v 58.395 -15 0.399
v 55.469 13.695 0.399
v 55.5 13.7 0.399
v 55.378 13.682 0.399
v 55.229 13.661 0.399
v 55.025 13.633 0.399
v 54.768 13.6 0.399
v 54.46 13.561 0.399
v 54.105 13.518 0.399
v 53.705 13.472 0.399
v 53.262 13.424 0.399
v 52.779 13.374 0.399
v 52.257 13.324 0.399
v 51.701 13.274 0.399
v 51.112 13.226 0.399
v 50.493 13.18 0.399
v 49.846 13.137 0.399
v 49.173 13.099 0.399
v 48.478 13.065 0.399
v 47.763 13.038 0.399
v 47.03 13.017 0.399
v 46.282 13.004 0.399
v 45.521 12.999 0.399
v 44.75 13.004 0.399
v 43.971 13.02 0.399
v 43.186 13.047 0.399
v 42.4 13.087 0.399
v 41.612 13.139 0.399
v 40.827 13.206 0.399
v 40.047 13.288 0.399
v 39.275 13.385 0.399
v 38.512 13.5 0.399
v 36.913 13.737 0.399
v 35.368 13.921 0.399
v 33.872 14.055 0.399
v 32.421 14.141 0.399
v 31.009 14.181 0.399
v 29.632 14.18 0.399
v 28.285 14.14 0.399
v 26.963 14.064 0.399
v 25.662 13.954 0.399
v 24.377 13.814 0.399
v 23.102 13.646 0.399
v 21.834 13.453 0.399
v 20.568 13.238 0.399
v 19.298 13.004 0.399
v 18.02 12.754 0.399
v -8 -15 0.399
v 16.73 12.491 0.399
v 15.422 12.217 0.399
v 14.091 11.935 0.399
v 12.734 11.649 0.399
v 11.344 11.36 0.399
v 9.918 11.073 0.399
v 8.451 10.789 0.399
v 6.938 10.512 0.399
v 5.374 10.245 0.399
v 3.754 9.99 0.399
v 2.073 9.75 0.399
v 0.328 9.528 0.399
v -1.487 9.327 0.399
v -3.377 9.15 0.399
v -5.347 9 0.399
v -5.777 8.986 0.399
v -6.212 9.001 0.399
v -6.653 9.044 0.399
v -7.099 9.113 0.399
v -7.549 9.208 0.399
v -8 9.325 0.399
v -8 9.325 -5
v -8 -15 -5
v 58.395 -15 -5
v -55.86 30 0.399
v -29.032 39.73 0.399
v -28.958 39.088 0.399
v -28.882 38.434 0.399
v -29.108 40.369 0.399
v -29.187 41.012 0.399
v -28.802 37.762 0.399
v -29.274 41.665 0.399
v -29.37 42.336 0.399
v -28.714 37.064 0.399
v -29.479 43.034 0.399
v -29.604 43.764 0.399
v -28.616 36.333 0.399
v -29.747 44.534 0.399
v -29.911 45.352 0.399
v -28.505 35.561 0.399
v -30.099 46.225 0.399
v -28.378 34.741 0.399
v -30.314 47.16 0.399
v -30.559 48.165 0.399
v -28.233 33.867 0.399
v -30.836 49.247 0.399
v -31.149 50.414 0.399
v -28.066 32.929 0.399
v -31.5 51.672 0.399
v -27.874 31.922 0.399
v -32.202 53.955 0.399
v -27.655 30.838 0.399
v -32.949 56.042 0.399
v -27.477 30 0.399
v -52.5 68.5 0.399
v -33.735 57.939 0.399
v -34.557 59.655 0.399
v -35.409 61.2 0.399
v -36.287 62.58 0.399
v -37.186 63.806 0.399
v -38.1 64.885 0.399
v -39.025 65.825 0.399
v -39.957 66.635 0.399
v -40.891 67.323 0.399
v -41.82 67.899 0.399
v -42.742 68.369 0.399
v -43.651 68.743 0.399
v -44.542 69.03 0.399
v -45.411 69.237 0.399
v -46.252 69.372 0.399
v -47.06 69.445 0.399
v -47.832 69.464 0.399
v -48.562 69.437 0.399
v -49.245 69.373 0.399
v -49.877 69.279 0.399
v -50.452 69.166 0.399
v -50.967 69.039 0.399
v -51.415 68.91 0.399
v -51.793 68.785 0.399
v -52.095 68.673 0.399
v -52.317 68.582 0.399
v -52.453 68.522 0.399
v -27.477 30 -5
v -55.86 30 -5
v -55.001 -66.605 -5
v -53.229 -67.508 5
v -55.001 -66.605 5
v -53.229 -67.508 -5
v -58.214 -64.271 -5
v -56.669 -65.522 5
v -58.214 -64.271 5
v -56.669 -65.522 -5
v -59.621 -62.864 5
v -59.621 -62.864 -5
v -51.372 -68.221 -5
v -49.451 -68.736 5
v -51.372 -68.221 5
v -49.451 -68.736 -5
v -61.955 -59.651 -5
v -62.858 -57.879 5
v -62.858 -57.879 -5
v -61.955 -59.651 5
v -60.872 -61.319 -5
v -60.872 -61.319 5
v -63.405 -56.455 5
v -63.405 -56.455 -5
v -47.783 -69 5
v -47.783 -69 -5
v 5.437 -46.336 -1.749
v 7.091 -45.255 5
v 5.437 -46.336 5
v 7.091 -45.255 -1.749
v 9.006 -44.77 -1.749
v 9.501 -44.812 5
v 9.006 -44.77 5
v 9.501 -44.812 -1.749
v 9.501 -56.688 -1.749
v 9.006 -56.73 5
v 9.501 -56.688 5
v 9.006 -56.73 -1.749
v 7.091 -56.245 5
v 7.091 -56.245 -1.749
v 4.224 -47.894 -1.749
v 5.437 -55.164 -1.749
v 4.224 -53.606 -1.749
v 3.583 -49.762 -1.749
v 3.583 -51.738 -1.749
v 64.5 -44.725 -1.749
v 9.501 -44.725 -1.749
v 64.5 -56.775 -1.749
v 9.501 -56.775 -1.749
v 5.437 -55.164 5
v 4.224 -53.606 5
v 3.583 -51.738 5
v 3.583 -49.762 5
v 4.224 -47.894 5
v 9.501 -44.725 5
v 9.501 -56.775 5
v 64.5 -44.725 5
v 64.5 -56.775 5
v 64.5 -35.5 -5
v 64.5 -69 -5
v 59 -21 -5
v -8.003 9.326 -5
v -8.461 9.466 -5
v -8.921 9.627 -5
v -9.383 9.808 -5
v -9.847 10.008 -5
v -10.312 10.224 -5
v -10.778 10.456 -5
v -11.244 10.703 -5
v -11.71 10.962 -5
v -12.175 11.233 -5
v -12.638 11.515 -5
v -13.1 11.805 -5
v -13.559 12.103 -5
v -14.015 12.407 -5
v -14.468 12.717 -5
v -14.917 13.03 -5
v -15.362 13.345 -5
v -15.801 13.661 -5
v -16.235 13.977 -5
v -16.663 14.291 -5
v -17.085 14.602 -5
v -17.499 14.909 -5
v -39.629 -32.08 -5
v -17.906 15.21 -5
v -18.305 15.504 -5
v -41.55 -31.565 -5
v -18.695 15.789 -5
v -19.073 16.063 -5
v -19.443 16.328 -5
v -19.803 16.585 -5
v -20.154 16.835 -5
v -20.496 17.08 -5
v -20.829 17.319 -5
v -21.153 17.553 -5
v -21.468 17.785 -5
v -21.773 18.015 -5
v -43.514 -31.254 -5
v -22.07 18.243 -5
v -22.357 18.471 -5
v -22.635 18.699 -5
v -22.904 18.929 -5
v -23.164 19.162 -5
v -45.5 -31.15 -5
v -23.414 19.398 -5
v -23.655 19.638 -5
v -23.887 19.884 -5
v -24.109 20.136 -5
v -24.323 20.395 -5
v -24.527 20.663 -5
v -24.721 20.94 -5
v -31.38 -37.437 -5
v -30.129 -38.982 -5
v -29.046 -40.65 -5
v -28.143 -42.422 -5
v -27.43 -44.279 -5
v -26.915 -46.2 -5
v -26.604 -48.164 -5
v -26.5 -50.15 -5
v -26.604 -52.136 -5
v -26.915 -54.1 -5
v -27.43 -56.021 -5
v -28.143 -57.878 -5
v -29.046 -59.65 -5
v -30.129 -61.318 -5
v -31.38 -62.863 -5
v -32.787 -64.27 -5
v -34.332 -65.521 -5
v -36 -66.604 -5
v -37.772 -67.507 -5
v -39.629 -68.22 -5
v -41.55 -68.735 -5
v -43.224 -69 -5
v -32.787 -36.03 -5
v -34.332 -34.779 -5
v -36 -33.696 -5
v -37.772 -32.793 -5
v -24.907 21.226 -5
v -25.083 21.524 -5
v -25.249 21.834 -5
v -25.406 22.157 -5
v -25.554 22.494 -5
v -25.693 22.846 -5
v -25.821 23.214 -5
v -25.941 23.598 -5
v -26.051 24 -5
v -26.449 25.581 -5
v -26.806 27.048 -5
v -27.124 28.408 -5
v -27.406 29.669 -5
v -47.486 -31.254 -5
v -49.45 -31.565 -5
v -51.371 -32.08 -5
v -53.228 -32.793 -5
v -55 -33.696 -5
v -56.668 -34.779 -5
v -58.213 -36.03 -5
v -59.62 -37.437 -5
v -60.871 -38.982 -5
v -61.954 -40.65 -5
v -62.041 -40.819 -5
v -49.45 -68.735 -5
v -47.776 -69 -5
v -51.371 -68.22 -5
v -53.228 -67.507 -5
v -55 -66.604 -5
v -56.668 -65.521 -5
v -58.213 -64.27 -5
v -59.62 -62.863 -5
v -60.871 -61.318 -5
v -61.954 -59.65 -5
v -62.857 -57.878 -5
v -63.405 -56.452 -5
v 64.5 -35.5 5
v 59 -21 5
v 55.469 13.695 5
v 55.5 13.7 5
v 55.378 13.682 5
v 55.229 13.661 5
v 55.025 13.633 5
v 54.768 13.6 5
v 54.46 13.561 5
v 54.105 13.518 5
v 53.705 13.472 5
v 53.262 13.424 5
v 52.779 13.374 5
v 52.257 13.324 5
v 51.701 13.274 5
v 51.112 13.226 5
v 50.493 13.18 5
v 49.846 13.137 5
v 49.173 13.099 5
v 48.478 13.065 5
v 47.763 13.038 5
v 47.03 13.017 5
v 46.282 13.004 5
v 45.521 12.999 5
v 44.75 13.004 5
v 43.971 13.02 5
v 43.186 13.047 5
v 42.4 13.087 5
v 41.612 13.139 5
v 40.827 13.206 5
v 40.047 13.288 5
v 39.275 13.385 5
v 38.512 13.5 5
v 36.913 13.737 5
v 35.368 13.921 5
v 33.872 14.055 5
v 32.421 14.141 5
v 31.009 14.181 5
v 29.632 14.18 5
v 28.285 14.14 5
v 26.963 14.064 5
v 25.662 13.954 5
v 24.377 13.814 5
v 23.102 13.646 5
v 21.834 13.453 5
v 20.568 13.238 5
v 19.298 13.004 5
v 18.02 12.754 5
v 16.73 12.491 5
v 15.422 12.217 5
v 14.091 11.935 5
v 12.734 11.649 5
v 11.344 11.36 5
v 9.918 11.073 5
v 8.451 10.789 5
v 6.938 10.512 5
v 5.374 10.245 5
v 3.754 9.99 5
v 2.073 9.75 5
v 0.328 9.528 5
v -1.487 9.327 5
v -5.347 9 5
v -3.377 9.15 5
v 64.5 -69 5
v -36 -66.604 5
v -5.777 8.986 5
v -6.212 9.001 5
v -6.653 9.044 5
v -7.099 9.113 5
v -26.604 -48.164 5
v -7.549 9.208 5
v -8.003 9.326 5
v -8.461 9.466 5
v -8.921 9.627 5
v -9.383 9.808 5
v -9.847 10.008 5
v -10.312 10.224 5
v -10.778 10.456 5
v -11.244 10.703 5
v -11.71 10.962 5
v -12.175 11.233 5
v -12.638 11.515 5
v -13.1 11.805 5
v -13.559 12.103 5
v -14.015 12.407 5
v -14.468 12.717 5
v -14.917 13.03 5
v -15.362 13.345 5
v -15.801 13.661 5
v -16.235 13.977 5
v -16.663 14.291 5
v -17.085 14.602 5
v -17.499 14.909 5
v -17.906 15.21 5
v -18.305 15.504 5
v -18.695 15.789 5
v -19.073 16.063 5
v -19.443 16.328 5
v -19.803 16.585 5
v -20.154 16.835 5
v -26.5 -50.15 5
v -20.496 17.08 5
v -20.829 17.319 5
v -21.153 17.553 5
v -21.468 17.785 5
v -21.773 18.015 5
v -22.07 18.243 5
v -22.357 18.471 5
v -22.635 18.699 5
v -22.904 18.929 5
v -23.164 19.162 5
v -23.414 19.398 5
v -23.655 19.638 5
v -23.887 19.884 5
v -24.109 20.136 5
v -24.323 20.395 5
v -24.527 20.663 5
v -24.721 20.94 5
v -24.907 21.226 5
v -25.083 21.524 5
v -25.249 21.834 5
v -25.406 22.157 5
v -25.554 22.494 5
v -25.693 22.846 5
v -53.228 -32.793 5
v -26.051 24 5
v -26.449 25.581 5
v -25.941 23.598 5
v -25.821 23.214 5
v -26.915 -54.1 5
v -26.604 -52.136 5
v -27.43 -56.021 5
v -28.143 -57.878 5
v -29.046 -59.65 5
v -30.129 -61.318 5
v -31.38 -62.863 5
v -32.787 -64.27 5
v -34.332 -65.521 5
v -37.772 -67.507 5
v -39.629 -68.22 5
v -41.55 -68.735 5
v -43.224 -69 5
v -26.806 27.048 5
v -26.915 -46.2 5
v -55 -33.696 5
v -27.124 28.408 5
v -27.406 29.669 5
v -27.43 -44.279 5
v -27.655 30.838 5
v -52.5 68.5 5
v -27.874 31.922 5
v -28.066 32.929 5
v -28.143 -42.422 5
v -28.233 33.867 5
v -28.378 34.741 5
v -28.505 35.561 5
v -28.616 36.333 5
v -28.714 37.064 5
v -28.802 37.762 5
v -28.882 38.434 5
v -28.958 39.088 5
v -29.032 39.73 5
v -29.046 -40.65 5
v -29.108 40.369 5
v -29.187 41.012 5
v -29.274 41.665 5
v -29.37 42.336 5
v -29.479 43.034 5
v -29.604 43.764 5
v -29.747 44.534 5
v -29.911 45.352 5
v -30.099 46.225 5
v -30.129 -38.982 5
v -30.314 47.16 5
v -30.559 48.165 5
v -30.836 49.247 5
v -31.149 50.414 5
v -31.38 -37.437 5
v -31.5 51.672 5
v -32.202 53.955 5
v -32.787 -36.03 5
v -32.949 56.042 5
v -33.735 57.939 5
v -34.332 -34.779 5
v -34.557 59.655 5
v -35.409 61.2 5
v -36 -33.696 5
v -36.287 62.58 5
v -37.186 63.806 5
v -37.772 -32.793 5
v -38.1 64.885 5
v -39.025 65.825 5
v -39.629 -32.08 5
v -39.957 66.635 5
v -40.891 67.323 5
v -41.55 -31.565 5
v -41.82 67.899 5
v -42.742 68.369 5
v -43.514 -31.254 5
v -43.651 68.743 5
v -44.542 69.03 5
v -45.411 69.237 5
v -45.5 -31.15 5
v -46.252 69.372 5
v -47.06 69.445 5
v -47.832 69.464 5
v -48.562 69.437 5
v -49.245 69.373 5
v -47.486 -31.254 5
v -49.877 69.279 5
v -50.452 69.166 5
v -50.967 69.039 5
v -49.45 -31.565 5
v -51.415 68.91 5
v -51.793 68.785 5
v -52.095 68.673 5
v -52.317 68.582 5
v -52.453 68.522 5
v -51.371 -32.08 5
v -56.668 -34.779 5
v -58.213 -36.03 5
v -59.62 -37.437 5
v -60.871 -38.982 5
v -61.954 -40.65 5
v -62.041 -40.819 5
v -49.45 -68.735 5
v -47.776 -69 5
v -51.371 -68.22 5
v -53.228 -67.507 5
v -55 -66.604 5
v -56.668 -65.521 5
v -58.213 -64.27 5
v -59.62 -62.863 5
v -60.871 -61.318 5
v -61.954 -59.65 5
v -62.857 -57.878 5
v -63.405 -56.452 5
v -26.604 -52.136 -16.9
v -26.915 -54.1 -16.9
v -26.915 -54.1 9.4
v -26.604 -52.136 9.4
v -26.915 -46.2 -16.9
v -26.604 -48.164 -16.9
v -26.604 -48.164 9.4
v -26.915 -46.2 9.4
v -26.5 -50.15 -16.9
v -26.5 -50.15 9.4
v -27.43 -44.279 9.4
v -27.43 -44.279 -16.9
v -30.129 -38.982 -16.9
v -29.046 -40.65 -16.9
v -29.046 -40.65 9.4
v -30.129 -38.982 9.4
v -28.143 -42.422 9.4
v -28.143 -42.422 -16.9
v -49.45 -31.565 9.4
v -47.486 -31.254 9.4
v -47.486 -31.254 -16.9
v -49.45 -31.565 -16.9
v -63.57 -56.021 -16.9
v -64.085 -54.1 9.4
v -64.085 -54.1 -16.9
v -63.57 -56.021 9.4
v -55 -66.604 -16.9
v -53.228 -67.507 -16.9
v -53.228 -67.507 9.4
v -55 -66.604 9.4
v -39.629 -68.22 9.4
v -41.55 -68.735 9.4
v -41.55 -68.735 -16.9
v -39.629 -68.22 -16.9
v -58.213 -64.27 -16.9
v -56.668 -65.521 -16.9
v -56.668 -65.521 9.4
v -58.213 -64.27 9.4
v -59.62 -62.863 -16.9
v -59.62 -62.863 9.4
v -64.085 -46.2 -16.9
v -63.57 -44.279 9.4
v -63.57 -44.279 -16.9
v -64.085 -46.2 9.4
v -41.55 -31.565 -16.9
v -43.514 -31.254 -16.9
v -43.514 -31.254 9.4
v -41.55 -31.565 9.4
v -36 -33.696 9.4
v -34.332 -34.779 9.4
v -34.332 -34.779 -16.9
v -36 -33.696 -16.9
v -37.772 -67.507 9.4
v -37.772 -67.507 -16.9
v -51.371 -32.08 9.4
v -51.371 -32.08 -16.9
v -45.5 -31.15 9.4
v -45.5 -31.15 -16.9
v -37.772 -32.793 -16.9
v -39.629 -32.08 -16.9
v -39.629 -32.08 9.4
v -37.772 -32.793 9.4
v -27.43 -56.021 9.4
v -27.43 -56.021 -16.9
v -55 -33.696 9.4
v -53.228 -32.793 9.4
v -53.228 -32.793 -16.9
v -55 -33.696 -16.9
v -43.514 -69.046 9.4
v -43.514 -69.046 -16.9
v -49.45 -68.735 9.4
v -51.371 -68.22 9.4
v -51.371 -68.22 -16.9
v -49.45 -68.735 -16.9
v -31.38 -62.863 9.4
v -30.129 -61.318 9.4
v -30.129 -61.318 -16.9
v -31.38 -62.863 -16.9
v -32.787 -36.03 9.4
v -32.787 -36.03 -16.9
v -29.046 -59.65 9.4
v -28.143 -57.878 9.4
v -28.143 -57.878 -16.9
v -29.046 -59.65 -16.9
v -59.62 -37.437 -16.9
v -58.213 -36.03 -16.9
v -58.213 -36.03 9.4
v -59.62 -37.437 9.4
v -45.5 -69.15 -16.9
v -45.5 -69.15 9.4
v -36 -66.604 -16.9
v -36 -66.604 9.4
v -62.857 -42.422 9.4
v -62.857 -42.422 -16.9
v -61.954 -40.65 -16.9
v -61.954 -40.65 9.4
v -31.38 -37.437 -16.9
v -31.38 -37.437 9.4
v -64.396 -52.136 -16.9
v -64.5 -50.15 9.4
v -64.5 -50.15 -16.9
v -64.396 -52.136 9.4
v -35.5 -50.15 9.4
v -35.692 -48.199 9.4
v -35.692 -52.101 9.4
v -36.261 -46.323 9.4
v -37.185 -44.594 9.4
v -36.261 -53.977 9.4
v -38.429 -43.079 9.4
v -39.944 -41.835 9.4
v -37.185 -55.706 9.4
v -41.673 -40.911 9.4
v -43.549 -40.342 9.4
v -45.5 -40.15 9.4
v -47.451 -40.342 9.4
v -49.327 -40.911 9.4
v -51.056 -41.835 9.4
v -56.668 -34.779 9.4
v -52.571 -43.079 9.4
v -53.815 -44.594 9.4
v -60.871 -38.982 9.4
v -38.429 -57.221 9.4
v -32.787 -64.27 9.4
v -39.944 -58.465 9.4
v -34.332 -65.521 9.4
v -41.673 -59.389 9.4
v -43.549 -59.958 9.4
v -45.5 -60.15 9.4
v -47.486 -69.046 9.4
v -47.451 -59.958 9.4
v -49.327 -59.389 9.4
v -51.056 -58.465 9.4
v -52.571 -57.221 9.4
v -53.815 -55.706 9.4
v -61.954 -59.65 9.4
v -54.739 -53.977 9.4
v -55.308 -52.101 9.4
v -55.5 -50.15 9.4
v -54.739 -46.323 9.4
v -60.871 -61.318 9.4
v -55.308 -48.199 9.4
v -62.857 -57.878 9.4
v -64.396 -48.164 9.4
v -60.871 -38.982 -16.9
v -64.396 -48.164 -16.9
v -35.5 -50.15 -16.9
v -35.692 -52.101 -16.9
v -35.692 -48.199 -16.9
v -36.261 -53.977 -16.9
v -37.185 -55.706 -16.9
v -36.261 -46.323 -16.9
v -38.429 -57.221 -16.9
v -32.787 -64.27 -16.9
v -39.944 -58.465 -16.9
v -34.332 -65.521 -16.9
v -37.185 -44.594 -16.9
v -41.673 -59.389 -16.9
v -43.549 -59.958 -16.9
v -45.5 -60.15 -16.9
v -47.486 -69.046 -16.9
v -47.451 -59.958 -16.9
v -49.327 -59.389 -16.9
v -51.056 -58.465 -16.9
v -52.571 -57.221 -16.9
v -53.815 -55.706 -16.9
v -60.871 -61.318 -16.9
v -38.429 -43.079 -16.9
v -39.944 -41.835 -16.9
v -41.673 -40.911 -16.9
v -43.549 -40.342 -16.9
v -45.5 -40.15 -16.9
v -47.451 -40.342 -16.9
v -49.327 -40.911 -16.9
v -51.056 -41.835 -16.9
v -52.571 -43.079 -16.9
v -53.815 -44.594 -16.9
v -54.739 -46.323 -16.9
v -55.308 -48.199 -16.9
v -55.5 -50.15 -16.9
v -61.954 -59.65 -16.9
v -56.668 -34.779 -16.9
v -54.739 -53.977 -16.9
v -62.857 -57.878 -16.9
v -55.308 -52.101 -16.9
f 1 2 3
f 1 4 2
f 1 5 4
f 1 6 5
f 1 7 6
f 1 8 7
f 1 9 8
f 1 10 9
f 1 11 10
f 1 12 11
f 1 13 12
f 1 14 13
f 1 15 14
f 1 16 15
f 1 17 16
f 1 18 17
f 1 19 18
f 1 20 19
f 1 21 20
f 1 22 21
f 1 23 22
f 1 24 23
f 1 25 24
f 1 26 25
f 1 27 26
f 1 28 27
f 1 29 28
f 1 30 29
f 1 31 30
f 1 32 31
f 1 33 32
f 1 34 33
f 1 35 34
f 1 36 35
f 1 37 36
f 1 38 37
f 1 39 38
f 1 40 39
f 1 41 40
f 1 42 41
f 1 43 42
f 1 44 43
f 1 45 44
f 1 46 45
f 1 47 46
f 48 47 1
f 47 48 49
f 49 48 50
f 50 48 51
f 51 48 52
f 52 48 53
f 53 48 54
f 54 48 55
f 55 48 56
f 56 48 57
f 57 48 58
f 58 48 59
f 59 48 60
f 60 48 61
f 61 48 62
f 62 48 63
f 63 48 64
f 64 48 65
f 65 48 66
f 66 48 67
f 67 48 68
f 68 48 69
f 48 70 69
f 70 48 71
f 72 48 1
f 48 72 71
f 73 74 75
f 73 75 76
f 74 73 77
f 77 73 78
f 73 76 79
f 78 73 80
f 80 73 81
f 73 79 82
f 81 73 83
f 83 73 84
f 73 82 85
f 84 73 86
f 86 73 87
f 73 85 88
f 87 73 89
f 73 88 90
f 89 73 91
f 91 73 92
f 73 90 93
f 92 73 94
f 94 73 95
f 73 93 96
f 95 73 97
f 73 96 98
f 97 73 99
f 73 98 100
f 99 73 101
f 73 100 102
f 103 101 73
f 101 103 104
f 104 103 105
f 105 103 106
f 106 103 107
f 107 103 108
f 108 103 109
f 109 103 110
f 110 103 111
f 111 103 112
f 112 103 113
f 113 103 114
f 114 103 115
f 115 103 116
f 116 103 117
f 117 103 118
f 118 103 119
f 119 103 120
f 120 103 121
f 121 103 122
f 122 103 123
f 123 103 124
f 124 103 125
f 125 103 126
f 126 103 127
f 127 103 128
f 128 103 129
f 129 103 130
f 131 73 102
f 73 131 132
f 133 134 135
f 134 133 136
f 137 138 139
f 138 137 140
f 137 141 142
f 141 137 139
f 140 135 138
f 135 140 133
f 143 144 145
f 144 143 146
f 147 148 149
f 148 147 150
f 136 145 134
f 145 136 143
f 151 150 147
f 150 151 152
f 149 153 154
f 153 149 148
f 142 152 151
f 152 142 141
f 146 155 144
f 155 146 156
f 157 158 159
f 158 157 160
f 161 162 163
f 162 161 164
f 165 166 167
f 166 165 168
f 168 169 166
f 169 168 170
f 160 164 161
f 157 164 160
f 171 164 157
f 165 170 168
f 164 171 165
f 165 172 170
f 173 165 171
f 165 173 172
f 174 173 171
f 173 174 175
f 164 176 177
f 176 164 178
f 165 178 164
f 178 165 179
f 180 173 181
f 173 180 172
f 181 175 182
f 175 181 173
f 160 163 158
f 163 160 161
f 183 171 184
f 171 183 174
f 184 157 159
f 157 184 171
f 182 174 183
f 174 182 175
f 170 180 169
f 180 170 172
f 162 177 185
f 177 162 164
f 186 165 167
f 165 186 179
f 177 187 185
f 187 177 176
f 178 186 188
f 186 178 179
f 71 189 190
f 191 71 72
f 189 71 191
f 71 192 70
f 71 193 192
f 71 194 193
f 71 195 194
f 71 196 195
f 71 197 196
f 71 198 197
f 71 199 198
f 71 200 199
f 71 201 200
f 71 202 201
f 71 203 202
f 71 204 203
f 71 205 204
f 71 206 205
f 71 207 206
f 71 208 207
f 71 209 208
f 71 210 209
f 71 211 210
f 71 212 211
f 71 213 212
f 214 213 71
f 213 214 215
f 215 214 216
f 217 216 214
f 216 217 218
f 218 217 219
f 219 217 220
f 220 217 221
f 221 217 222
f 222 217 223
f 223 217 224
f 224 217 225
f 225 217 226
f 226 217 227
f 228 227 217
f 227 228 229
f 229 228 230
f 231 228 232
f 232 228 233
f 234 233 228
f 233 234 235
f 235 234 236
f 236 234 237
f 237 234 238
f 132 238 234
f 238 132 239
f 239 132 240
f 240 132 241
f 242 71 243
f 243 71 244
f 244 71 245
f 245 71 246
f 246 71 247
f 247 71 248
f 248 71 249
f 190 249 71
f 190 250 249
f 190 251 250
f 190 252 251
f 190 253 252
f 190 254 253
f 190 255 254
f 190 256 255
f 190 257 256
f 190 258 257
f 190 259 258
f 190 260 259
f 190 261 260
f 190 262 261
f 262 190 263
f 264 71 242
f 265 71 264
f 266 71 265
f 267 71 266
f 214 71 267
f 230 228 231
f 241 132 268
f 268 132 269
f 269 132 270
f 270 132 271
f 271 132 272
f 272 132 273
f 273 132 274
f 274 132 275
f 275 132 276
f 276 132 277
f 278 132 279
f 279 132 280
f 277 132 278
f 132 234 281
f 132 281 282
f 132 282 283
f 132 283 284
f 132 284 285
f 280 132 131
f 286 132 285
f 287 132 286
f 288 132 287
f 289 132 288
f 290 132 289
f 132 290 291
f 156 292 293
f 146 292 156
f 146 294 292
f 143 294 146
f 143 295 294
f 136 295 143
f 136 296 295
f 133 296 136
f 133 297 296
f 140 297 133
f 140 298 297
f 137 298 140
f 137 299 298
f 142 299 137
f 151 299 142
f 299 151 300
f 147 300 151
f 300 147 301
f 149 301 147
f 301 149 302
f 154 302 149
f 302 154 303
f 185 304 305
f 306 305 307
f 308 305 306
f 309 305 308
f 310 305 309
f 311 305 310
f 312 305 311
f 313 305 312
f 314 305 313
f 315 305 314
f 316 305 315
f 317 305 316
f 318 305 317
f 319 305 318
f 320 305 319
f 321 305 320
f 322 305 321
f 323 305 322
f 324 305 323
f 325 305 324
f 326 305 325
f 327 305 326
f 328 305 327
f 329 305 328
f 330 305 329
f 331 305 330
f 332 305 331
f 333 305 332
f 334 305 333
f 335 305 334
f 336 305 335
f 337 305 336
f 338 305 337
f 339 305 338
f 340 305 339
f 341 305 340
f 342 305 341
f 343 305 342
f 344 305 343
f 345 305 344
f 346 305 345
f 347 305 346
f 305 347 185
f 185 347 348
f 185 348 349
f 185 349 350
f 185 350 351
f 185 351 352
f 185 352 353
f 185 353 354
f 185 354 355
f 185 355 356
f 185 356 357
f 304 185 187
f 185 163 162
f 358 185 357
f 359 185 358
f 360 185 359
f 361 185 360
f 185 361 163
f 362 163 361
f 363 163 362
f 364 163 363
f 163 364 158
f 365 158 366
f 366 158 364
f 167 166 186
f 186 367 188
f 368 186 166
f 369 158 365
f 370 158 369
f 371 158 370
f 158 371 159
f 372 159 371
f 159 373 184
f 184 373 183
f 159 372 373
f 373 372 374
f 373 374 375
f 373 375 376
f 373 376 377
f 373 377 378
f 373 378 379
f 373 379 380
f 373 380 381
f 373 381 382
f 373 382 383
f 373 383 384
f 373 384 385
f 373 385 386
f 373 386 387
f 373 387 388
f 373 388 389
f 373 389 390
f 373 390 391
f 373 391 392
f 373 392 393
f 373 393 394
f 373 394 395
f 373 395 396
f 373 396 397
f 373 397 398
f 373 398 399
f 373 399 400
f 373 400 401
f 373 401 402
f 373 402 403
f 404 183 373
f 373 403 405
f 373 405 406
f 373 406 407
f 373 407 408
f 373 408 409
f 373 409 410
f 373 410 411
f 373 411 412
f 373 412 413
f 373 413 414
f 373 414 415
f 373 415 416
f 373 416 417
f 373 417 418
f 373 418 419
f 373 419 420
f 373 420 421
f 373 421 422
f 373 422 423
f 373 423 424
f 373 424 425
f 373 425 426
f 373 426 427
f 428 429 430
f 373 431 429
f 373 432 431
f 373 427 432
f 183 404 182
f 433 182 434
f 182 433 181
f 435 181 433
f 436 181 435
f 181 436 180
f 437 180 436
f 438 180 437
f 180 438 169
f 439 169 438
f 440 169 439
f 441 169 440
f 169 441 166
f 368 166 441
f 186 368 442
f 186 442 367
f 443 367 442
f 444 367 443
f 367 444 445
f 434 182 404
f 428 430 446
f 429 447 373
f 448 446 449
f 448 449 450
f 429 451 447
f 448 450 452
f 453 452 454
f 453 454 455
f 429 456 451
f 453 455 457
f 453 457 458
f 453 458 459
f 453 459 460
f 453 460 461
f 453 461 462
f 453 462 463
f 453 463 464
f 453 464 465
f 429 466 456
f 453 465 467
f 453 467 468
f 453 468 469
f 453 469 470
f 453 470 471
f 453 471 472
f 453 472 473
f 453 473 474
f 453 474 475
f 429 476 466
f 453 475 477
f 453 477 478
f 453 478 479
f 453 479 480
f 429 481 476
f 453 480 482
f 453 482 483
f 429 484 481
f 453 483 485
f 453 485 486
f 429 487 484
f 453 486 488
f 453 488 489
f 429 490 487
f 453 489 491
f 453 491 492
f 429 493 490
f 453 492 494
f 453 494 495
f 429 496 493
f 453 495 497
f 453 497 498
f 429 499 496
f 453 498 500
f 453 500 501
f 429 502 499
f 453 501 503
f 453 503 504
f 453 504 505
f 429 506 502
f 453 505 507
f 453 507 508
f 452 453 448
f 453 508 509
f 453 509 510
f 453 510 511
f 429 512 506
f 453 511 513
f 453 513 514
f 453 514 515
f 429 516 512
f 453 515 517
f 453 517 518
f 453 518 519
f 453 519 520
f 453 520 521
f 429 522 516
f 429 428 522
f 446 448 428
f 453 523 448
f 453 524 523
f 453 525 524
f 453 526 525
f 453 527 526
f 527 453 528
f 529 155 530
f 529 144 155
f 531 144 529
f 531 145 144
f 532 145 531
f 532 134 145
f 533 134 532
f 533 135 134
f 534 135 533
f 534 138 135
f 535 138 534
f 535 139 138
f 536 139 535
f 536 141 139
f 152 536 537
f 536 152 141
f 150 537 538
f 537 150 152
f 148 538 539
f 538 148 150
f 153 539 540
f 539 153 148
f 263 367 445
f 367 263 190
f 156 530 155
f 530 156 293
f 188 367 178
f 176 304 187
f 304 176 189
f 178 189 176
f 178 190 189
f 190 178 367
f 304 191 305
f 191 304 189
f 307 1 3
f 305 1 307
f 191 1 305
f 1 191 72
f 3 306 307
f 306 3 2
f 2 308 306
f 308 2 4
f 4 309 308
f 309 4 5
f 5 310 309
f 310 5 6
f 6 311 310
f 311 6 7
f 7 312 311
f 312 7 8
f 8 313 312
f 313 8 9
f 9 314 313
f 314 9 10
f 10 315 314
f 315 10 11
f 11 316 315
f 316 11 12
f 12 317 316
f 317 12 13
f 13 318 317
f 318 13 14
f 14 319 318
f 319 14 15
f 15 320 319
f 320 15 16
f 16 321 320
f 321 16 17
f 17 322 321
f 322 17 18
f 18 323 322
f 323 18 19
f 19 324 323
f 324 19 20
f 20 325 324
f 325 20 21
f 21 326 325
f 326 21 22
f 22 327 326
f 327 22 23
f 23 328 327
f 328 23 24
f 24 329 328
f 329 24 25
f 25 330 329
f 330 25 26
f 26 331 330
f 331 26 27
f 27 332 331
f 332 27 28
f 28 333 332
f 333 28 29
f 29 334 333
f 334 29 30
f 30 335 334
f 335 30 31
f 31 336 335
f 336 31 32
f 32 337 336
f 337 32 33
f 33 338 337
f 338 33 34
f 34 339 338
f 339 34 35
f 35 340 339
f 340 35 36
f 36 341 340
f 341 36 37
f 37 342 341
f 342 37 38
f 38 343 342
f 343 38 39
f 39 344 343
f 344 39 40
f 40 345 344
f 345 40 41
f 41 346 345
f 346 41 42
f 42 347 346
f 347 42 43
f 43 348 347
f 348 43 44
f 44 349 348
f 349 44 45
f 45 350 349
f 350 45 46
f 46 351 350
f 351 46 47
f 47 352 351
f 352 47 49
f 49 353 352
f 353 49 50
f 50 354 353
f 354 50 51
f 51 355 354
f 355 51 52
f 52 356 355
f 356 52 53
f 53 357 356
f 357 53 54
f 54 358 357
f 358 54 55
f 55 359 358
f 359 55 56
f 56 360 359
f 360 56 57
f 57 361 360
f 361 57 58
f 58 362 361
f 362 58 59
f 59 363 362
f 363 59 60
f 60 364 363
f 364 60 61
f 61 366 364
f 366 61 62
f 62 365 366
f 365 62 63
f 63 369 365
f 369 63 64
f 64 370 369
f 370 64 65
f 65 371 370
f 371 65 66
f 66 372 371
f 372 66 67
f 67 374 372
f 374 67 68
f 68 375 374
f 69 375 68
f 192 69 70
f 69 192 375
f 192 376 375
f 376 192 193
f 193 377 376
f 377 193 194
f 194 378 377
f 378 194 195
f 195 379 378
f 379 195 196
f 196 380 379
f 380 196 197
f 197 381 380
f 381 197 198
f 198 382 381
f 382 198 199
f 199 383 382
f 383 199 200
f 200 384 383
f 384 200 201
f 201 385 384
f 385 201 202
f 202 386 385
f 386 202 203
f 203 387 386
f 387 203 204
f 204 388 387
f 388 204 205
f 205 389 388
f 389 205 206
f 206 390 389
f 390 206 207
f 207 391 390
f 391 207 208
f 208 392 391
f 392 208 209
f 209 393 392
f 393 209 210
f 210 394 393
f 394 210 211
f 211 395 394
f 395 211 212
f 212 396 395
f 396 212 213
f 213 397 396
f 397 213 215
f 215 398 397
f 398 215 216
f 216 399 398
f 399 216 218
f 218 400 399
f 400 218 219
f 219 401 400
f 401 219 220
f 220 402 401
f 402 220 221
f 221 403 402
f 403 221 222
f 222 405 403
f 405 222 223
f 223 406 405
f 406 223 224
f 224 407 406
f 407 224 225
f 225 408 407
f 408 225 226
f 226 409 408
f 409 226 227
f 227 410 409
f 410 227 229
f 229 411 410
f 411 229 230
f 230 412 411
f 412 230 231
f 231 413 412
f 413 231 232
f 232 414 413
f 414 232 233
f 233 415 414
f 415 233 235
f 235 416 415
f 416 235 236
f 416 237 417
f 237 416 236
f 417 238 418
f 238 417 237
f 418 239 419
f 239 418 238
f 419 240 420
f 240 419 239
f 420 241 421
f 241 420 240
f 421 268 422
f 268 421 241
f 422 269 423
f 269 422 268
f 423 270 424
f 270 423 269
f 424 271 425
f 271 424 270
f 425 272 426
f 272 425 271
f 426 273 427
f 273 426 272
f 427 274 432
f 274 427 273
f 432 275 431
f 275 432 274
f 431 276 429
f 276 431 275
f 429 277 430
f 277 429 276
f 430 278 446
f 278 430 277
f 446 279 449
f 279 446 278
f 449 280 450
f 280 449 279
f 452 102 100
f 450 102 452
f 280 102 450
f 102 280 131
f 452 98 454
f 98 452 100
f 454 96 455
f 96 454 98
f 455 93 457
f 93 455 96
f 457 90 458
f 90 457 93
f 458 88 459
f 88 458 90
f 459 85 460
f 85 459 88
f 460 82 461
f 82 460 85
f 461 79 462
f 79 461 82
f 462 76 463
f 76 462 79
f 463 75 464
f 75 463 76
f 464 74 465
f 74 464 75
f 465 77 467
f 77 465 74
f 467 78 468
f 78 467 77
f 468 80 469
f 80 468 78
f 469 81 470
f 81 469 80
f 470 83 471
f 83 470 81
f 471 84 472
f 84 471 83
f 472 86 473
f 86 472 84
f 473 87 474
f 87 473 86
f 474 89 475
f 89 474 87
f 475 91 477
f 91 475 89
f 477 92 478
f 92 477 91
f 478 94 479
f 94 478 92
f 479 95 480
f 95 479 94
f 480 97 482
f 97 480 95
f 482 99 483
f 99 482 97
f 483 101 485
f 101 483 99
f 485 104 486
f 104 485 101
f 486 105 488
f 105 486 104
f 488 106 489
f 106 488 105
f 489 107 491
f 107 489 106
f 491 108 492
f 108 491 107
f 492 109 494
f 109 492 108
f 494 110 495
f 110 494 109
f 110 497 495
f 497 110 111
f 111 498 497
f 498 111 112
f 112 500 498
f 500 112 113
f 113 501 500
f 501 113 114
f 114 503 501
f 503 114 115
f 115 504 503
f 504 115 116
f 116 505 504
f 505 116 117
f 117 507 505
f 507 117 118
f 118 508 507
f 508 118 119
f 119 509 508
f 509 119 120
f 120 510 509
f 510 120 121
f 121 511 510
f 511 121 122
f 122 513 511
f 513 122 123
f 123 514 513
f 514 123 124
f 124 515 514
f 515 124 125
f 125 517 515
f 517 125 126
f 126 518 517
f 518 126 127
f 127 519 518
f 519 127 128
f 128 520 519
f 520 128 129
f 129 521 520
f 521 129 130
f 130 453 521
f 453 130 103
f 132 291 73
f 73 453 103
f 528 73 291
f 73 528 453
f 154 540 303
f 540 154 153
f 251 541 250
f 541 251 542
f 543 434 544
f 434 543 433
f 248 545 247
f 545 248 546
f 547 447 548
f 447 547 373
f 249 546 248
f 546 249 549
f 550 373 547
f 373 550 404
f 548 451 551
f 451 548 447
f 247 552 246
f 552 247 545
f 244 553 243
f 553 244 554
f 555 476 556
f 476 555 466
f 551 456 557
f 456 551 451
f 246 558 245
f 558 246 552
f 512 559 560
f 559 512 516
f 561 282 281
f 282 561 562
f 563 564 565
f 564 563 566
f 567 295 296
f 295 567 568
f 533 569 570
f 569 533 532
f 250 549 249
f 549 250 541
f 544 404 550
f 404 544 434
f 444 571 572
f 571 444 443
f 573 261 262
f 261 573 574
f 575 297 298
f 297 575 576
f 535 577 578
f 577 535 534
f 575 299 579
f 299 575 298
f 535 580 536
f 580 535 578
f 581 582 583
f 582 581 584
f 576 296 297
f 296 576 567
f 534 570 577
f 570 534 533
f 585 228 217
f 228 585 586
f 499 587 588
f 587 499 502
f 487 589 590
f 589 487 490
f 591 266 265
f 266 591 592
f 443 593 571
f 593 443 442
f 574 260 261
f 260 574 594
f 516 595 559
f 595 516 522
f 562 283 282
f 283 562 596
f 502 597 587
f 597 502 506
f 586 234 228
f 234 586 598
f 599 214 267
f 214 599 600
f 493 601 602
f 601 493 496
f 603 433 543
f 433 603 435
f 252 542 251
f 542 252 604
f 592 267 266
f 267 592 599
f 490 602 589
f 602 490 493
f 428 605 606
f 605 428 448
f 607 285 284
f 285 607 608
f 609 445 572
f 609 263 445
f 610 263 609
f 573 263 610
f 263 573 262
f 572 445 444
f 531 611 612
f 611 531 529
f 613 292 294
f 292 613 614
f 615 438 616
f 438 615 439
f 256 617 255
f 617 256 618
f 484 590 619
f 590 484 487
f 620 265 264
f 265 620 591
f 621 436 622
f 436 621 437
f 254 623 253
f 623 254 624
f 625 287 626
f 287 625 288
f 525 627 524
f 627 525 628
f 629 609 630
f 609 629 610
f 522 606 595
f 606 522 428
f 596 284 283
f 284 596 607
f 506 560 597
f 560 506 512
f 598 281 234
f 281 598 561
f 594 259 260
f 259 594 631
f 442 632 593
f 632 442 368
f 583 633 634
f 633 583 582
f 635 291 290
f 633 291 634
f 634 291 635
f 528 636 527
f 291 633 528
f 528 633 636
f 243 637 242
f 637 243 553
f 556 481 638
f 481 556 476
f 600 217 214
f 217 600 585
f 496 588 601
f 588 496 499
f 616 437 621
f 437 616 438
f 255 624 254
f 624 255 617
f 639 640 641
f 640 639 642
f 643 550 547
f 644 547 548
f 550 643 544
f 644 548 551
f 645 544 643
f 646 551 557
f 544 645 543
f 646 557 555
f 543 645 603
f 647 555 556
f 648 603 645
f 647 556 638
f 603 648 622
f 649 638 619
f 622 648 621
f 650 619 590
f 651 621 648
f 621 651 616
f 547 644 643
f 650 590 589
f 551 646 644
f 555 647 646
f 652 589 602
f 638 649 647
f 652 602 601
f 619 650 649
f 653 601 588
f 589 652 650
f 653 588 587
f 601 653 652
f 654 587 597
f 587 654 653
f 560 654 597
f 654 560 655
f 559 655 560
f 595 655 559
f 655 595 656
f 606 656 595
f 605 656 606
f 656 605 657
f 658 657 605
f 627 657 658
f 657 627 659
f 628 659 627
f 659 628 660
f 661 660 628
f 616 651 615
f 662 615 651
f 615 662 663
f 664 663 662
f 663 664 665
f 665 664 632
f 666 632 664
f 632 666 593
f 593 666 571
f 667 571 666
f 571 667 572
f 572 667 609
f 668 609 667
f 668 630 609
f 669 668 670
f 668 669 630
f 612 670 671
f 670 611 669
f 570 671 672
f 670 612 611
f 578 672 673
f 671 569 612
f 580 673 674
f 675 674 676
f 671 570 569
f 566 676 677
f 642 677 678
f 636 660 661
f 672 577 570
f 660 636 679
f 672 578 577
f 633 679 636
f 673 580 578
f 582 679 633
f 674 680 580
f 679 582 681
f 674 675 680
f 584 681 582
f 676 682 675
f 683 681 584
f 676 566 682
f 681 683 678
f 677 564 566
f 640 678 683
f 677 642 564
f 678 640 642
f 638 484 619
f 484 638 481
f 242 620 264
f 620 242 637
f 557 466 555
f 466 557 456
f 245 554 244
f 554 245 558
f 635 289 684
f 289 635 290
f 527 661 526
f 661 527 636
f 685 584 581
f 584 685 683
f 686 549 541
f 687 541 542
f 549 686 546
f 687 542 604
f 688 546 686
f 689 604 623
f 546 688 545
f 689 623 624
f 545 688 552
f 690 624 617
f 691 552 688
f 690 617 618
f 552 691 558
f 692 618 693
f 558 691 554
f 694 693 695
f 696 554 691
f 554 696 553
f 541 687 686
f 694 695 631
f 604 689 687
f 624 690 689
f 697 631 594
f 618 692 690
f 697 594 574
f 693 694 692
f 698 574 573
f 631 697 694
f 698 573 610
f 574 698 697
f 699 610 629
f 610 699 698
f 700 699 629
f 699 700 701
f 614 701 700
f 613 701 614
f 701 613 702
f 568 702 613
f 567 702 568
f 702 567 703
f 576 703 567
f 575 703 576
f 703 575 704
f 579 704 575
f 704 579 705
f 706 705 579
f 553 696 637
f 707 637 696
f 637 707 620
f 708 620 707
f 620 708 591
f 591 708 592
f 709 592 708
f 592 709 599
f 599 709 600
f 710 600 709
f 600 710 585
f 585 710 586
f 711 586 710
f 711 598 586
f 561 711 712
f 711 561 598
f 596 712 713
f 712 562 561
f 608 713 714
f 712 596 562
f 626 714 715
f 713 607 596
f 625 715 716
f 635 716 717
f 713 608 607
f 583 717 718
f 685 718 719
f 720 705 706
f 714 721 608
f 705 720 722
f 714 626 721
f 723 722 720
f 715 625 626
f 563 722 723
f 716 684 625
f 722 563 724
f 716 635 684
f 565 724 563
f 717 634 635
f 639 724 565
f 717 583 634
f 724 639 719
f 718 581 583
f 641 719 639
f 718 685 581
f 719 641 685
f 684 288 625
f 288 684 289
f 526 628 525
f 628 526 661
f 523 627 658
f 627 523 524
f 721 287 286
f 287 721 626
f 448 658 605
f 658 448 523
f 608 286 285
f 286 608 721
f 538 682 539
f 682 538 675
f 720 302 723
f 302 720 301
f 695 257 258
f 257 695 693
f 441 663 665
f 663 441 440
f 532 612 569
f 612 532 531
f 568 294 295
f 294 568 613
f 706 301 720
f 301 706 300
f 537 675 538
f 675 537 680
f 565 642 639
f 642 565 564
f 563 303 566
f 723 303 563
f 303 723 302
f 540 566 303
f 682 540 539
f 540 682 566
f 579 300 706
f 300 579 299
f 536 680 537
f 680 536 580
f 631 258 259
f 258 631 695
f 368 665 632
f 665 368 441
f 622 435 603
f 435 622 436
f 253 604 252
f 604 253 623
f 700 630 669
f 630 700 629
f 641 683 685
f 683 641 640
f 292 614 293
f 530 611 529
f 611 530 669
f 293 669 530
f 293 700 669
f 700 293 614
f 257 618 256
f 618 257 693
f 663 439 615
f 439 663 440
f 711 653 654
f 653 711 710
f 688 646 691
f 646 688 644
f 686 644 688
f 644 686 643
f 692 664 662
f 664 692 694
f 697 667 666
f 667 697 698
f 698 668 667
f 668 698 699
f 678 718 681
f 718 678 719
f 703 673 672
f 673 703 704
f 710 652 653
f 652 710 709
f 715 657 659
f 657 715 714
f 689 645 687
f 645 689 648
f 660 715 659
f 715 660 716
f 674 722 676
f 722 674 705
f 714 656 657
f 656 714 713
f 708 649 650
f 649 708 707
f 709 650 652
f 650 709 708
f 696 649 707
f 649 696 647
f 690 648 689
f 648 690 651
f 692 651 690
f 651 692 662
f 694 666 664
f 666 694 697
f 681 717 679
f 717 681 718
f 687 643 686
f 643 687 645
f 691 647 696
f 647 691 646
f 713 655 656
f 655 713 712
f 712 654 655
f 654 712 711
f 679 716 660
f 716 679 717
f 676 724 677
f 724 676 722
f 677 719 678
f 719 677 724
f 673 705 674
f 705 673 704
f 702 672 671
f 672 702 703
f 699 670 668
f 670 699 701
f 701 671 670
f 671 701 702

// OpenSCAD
/**
 * @file dtrBrakeCarrier.scad
 *
 * @version 1.0
 *
 * @author Calum Judd Anderson
 *
 * @brief Yamaha DTRE Brake Carrier for 3ET Swinging Arm with Aprilia RS 125 Wheels
 */
$fa = 0.01;

INTERFERENCE_FIT = 0.001;
SLIDE_FIT = 0.05;

CALIPER_CARRIER_THICKNESS = 10;
CALIPER_BRACKET_THICKNESS = 5.4;

WHEEL_SPINDLE_SPACER_HEIGHT = 26.3;
WHEEL_SPINDLE_SPACER_OUTER_RADIUS = 19;
WHEEL_SPINDLE_RADIUS = 10;

/* The size of the carrier at its most extreme width, aka the bottom part */
CARRIER_MAX_WIDTH = 129;
/* The size of the carrier at its most extreme height, aka the left part */
CARRIER_MAX_HEIGHT = 137.50;
CARRIER_HEIGHT_OFFSET = -0.4;

SWINGING_ARM_SLIDE_CUTOUT_HEIGHT = 13.5;
SWINGING_ARM_SLIDE_CUTOUT_DEPTH  = 12;
SWINGING_ARM_SLIDE_CUTOUT_LENGTH = 55;
SWINGING_ARM_SLIDE_DISTANCE_FROM_BOTTOM = 12;

/**
 * @brief Creates the left wheelspacer
 */
module leftWheelSpacer() {
    difference() {
        cylinder(8, WHEEL_SPINDLE_SPACER_OUTER_RADIUS+5, WHEEL_SPINDLE_SPACER_OUTER_RADIUS+5, center=true);
        cylinder(8, WHEEL_SPINDLE_RADIUS,WHEEL_SPINDLE_RADIUS, center=true);
    }
}

/**
 * @brief The cutoff for the lower left corner
 */
module lowerLeftCornerCutout() {
    difference() {
        outlineBrakeCarrier(CALIPER_CARRIER_THICKNESS+2);
        translate([-(CARRIER_MAX_WIDTH/2) + WHEEL_SPINDLE_SPACER_OUTER_RADIUS, -(CARRIER_MAX_HEIGHT/2) + WHEEL_SPINDLE_SPACER_OUTER_RADIUS + CARRIER_HEIGHT_OFFSET, 0])
            wheelSpindleSpacer(WHEEL_SPINDLE_SPACER_HEIGHT);
            translate([40, -134, -(CALIPER_CARRIER_THICKNESS+10)/2])
        rotate([0, 0 ,53 ])
            cube([150, 200, CALIPER_CARRIER_THICKNESS+10]);
    }
}

/**
 * @brief The outline of the carrier extruded
 *
 * @param height - The height to perform the linear_extrude to
 */
module outlineBrakeCarrier(height) {
    linear_extrude(height, center=true)
//        import("outline-curved.svg", center=true);
        translate([-65.5, 81, 0])
        Layer_1();
}

/**
 * @brief The cutout for the swinging arm slide to rest against
 */
module swingingArmSlideCutout() {
    union() {
        translate([-SWINGING_ARM_SLIDE_CUTOUT_LENGTH/2, 0, 0])
            cylinder(SWINGING_ARM_SLIDE_CUTOUT_HEIGHT, SWINGING_ARM_SLIDE_CUTOUT_DEPTH/2, SWINGING_ARM_SLIDE_CUTOUT_DEPTH/2, center=true);
            cube([SWINGING_ARM_SLIDE_CUTOUT_LENGTH, SWINGING_ARM_SLIDE_CUTOUT_DEPTH + SLIDE_FIT, SWINGING_ARM_SLIDE_CUTOUT_HEIGHT], center=true);
    }
}

/**
 * @brief The lower left corner where the spindle goes through
 */
module wheelSpindleSpacer(height) {
    difference() {
        cylinder(height, WHEEL_SPINDLE_SPACER_OUTER_RADIUS, WHEEL_SPINDLE_SPACER_OUTER_RADIUS, center=true);
        cylinder(height+INTERFERENCE_FIT, WHEEL_SPINDLE_RADIUS, WHEEL_SPINDLE_RADIUS, center=true);
    }
}

/**
 * @brief The brake carrier
 */
module brakeCarrier() {   
    union() {
        difference() {
            /* Brake Carrier */
            outlineBrakeCarrier(CALIPER_CARRIER_THICKNESS);
    
            /* Caliper Mount */
            /* Cutout For Brake Mount */
            union() {
                color("red")
                    translate([-8, -15, CALIPER_BRACKET_THICKNESS-CALIPER_CARRIER_THICKNESS-0.4 - INTERFERENCE_FIT])
                        cube([70, 40, CALIPER_BRACKET_THICKNESS]);
            
                    color("red")
                        translate([20-82, 30, CALIPER_BRACKET_THICKNESS-CALIPER_CARRIER_THICKNESS-0.4 - INTERFERENCE_FIT])
                            cube([40, 40, CALIPER_BRACKET_THICKNESS]);
            }
            /* Holes */
//            translate([-41, 43.64, 0])
//                rotate([0, 0, -30])
//                    union() {
//                        cylinder(CALIPER_BRACKET_THICKNESS +10, 4.1, 4.1, center=true);
//                        translate([85, 0, 0])
//                            cylinder(CALIPER_BRACKET_THICKNESS+10, 4.1, 4.1, center=true);
//                    }
                    
            /* Bottom Left Cutout to make it round */
            translate([-INTERFERENCE_FIT, -INTERFERENCE_FIT, 0])
                lowerLeftCornerCutout();
            
            /* Cutout for the spindle to go through */
            translate([-(CARRIER_MAX_WIDTH/2) + WHEEL_SPINDLE_SPACER_OUTER_RADIUS, -(CARRIER_MAX_HEIGHT/2) + WHEEL_SPINDLE_SPACER_OUTER_RADIUS + CARRIER_HEIGHT_OFFSET, 0])
                cylinder(WHEEL_SPINDLE_SPACER_HEIGHT+10, WHEEL_SPINDLE_RADIUS + SLIDE_FIT, WHEEL_SPINDLE_RADIUS + SLIDE_FIT, center=true);
            
            /* Swinging arm slide cutout */
            translate([((CARRIER_MAX_WIDTH - SWINGING_ARM_SLIDE_CUTOUT_LENGTH)/2) + INTERFERENCE_FIT, ((-CARRIER_MAX_HEIGHT + SWINGING_ARM_SLIDE_CUTOUT_DEPTH)/2) + SWINGING_ARM_SLIDE_DISTANCE_FROM_BOTTOM, 5+INTERFERENCE_FIT])
                swingingArmSlideCutout();
        }

        /* Wheel Spacer */
        translate([-(CARRIER_MAX_WIDTH/2) + WHEEL_SPINDLE_SPACER_OUTER_RADIUS, -(CARRIER_MAX_HEIGHT/2) + WHEEL_SPINDLE_SPACER_OUTER_RADIUS + CARRIER_HEIGHT_OFFSET, ((CALIPER_CARRIER_THICKNESS-WHEEL_SPINDLE_SPACER_HEIGHT)/2) + 4.4])
            wheelSpindleSpacer(WHEEL_SPINDLE_SPACER_HEIGHT);
    }
}
 
brakeCarrier();
//translate([100, 0 ,0])
//    leftWheelSpacer();

// Group ID: layer1
module Layer_1() {
	// Path ID: path113
	bezier_polygon([[[130.0, -150.0], [130.0, -150.0], [1.0, -150.0], [1.0, -150.0]], [[1.0, -150.0], [1.0, -150.0], [13.0, -12.5], [13.0, -12.5]], [[13.0, -12.5], [13.0, -12.5], [27.22112, -5.4780099], [34.0, -29.328111]], [[34.0, -29.328111], [37.71307, -42.391787], [35.249094, -40.598198], [39.449, -57.0]], [[39.449, -57.0], [40.502151999999995, -61.11285], [42.975988, -62.423243], [46.805, -65.211]], [[46.805, -65.211], [50.662141, -68.019237], [55.886022, -72.288725], [60.153, -72.0]], [[60.153, -72.0], [80.261262, -70.639373], [87.738012, -64.849601], [104.01155, -67.5]], [[104.01155, -67.5], [111.58475, -68.733414], [121.0, -67.3], [121.0, -67.3]], [[121.0, -67.3], [121.0, -67.3], [124.5, -102.0], [124.5, -102.0]], [[124.5, -102.0], [124.5, -102.0], [130.0, -116.5], [130.0, -116.5]], [[130.0, -116.5], [130.0, -116.5], [130.0, -150.0], [130.0, -150.0]], [[130.0, -150.0], [130.0, -150.0], [130.0, -150.0], [130.0, -150.0]]]);
}

/**
 * Stripped down version of "bezier_v2.scad".
 * For full version, see: https://www.thingiverse.com/thing:2170645
 */

function BEZ03(u) = pow((1-u), 3);
function BEZ13(u) = 3*u*(pow((1-u),2));
function BEZ23(u) = 3*(pow(u,2))*(1-u);
function BEZ33(u) = pow(u,3);

function bezier_2D_point(p0, p1, p2, p3, u) = [
	BEZ03(u)*p0[0]+BEZ13(u)*p1[0]+BEZ23(u)*p2[0]+BEZ33(u)*p3[0],
	BEZ03(u)*p0[1]+BEZ13(u)*p1[1]+BEZ23(u)*p2[1]+BEZ33(u)*p3[1]
];

function bezier_coordinates(points, steps) = [
	for (c = points)
		for (step = [0:steps])
			bezier_2D_point(c[0], c[1], c[2],c[3], step/steps)
];

module bezier_polygon(points) {
	steps = $fn <= 0 ? 30 : $fn;
	polygon(bezier_coordinates(points, steps));
}
